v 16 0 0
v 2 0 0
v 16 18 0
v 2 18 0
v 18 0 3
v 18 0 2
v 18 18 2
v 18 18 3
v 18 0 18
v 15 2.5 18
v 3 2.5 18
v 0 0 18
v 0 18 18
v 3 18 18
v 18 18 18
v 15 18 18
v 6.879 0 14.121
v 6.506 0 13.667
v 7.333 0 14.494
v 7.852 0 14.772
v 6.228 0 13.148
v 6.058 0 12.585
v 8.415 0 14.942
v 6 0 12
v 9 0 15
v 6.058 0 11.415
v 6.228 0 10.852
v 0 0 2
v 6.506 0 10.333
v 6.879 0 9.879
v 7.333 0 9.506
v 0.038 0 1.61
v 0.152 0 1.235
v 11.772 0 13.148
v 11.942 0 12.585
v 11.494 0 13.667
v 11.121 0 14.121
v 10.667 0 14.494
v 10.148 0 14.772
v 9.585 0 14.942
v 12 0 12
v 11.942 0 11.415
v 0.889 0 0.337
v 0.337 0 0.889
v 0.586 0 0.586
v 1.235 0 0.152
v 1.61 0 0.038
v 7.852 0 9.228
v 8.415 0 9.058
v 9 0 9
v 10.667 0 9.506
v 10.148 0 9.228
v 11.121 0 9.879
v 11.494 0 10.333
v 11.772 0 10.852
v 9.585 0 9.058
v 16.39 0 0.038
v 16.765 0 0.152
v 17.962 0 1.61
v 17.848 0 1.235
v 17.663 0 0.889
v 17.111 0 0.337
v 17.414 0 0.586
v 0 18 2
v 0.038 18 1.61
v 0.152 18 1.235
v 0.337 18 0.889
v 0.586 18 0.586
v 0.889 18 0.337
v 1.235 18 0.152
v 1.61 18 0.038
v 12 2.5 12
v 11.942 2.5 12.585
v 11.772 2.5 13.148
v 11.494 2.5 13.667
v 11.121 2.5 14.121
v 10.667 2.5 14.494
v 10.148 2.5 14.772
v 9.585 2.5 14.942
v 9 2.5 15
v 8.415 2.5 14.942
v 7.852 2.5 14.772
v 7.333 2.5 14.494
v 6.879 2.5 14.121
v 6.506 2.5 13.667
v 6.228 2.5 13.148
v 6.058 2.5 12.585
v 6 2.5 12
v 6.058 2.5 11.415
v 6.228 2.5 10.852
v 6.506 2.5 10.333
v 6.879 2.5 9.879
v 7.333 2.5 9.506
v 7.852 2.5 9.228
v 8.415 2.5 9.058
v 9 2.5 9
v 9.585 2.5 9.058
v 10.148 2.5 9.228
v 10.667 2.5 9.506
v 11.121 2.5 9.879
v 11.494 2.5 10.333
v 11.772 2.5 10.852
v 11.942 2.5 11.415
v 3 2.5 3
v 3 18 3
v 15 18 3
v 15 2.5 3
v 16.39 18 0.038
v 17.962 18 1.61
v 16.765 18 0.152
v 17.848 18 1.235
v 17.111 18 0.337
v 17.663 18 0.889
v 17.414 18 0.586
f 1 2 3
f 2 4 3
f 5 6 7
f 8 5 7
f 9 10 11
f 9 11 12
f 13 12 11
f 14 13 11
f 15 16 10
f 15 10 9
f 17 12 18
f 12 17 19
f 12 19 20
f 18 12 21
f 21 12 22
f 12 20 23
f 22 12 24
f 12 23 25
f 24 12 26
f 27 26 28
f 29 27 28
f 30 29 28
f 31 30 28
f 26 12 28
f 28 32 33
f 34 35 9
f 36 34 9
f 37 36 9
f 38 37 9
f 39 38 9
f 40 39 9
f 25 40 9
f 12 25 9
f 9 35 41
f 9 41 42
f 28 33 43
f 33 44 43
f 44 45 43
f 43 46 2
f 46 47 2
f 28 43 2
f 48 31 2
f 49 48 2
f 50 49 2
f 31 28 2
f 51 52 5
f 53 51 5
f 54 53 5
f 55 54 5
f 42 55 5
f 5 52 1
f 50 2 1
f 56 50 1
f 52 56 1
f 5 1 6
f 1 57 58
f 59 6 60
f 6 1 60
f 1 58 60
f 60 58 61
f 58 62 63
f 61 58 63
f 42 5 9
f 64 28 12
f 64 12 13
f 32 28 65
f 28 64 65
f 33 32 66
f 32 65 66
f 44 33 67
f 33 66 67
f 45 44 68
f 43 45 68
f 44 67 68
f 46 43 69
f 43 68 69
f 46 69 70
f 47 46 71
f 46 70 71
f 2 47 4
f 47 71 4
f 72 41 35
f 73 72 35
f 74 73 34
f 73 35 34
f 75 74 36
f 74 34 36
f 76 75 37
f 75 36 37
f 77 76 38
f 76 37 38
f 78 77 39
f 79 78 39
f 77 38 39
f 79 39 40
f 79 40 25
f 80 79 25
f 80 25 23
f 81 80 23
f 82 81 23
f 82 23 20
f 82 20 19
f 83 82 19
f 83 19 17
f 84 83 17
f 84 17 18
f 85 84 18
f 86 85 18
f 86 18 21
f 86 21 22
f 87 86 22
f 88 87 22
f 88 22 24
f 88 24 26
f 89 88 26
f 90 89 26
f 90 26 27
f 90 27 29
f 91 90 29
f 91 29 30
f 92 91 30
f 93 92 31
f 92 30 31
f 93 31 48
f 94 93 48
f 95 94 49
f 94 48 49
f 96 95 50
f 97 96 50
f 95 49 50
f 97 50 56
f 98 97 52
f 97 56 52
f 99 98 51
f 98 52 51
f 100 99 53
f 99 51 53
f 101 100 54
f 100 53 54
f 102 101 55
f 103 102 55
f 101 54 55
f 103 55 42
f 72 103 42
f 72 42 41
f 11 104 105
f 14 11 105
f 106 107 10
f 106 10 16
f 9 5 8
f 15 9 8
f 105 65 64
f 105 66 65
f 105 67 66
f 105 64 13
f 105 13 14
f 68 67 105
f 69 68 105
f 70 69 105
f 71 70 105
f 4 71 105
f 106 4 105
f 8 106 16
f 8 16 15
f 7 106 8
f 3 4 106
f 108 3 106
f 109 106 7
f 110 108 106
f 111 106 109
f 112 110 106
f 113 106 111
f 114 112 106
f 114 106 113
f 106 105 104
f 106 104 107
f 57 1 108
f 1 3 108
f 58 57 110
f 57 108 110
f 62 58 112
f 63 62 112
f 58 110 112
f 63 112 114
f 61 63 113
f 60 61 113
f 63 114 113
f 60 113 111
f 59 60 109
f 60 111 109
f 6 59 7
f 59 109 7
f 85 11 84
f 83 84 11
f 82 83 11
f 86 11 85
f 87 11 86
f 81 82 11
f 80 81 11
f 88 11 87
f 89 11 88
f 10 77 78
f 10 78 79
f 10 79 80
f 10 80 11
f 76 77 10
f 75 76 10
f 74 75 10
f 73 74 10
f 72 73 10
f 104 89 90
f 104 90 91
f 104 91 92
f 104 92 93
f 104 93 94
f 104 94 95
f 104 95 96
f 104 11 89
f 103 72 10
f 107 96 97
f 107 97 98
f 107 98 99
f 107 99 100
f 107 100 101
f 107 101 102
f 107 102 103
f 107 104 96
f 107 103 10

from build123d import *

# Parameters (mm, degrees)
SKETCH1_W           = 18
SKETCH1_H           = 18
BOSS_EXTRUDE2_DEPTH = 3
SKETCH2_W           = 3
SKETCH2_H           = 18
BOSS_EXTRUDE3_DEPTH = 15
SKETCH3_W           = 3
SKETCH3_H           = 18
BOSS_EXTRUDE4_DEPTH = 15
SKETCH5_W           = 11.999914095
SKETCH5_H           = 2.5
BOSS_EXTRUDE5_DEPTH = 15
FILLET1_R           = 2
FILLET2_R           = 2
SKETCH6_R           = 3
CUT_EXTRUDE1_DEPTH  = 19


with BuildPart() as part:
    # Sketch1 → Boss-Extrude2 (new body)
    with BuildSketch(Plane.XY):
        with Locations((9, 9)):
            Rectangle(SKETCH1_W, SKETCH1_H)
    extrude(amount=BOSS_EXTRUDE2_DEPTH)

    # Sketch2 → Boss-Extrude3 (add)
    with BuildSketch(Plane.XY.offset(3)):
        with Locations((16.499914095, 9)):
            Rectangle(SKETCH2_W, SKETCH2_H)
    extrude(amount=BOSS_EXTRUDE3_DEPTH)

    # Sketch3 → Boss-Extrude4 (add)
    with BuildSketch(Plane.XY.offset(3)):
        with Locations((1.5, 9)):
            Rectangle(SKETCH3_W, SKETCH3_H)
    extrude(amount=BOSS_EXTRUDE4_DEPTH)

    # Sketch5 → Boss-Extrude5 (add)
    with BuildSketch(Plane.XY.offset(3)):
        with Locations((8.999957048, 1.25)):
            Rectangle(SKETCH5_W, SKETCH5_H)
    extrude(amount=BOSS_EXTRUDE5_DEPTH)

    # Fillet1
    fillet1_edges = [part.edges().sort_by_distance(p)[0] for p in [
        (0, 9, 0),
    ]]
    fillet(fillet1_edges, radius=FILLET1_R)

    # Fillet2
    fillet2_edges = [part.edges().sort_by_distance(p)[0] for p in [
        (18, 9, 0),
    ]]
    fillet(fillet2_edges, radius=FILLET2_R)

    # Sketch6 → Cut-Extrude1 (cut, through all)
    with BuildSketch(Plane.XZ):
        with Locations((8.999957047, 12)):
            Circle(SKETCH6_R)
    extrude(amount=-CUT_EXTRUDE1_DEPTH, mode=Mode.SUBTRACT)


solid = part.part
